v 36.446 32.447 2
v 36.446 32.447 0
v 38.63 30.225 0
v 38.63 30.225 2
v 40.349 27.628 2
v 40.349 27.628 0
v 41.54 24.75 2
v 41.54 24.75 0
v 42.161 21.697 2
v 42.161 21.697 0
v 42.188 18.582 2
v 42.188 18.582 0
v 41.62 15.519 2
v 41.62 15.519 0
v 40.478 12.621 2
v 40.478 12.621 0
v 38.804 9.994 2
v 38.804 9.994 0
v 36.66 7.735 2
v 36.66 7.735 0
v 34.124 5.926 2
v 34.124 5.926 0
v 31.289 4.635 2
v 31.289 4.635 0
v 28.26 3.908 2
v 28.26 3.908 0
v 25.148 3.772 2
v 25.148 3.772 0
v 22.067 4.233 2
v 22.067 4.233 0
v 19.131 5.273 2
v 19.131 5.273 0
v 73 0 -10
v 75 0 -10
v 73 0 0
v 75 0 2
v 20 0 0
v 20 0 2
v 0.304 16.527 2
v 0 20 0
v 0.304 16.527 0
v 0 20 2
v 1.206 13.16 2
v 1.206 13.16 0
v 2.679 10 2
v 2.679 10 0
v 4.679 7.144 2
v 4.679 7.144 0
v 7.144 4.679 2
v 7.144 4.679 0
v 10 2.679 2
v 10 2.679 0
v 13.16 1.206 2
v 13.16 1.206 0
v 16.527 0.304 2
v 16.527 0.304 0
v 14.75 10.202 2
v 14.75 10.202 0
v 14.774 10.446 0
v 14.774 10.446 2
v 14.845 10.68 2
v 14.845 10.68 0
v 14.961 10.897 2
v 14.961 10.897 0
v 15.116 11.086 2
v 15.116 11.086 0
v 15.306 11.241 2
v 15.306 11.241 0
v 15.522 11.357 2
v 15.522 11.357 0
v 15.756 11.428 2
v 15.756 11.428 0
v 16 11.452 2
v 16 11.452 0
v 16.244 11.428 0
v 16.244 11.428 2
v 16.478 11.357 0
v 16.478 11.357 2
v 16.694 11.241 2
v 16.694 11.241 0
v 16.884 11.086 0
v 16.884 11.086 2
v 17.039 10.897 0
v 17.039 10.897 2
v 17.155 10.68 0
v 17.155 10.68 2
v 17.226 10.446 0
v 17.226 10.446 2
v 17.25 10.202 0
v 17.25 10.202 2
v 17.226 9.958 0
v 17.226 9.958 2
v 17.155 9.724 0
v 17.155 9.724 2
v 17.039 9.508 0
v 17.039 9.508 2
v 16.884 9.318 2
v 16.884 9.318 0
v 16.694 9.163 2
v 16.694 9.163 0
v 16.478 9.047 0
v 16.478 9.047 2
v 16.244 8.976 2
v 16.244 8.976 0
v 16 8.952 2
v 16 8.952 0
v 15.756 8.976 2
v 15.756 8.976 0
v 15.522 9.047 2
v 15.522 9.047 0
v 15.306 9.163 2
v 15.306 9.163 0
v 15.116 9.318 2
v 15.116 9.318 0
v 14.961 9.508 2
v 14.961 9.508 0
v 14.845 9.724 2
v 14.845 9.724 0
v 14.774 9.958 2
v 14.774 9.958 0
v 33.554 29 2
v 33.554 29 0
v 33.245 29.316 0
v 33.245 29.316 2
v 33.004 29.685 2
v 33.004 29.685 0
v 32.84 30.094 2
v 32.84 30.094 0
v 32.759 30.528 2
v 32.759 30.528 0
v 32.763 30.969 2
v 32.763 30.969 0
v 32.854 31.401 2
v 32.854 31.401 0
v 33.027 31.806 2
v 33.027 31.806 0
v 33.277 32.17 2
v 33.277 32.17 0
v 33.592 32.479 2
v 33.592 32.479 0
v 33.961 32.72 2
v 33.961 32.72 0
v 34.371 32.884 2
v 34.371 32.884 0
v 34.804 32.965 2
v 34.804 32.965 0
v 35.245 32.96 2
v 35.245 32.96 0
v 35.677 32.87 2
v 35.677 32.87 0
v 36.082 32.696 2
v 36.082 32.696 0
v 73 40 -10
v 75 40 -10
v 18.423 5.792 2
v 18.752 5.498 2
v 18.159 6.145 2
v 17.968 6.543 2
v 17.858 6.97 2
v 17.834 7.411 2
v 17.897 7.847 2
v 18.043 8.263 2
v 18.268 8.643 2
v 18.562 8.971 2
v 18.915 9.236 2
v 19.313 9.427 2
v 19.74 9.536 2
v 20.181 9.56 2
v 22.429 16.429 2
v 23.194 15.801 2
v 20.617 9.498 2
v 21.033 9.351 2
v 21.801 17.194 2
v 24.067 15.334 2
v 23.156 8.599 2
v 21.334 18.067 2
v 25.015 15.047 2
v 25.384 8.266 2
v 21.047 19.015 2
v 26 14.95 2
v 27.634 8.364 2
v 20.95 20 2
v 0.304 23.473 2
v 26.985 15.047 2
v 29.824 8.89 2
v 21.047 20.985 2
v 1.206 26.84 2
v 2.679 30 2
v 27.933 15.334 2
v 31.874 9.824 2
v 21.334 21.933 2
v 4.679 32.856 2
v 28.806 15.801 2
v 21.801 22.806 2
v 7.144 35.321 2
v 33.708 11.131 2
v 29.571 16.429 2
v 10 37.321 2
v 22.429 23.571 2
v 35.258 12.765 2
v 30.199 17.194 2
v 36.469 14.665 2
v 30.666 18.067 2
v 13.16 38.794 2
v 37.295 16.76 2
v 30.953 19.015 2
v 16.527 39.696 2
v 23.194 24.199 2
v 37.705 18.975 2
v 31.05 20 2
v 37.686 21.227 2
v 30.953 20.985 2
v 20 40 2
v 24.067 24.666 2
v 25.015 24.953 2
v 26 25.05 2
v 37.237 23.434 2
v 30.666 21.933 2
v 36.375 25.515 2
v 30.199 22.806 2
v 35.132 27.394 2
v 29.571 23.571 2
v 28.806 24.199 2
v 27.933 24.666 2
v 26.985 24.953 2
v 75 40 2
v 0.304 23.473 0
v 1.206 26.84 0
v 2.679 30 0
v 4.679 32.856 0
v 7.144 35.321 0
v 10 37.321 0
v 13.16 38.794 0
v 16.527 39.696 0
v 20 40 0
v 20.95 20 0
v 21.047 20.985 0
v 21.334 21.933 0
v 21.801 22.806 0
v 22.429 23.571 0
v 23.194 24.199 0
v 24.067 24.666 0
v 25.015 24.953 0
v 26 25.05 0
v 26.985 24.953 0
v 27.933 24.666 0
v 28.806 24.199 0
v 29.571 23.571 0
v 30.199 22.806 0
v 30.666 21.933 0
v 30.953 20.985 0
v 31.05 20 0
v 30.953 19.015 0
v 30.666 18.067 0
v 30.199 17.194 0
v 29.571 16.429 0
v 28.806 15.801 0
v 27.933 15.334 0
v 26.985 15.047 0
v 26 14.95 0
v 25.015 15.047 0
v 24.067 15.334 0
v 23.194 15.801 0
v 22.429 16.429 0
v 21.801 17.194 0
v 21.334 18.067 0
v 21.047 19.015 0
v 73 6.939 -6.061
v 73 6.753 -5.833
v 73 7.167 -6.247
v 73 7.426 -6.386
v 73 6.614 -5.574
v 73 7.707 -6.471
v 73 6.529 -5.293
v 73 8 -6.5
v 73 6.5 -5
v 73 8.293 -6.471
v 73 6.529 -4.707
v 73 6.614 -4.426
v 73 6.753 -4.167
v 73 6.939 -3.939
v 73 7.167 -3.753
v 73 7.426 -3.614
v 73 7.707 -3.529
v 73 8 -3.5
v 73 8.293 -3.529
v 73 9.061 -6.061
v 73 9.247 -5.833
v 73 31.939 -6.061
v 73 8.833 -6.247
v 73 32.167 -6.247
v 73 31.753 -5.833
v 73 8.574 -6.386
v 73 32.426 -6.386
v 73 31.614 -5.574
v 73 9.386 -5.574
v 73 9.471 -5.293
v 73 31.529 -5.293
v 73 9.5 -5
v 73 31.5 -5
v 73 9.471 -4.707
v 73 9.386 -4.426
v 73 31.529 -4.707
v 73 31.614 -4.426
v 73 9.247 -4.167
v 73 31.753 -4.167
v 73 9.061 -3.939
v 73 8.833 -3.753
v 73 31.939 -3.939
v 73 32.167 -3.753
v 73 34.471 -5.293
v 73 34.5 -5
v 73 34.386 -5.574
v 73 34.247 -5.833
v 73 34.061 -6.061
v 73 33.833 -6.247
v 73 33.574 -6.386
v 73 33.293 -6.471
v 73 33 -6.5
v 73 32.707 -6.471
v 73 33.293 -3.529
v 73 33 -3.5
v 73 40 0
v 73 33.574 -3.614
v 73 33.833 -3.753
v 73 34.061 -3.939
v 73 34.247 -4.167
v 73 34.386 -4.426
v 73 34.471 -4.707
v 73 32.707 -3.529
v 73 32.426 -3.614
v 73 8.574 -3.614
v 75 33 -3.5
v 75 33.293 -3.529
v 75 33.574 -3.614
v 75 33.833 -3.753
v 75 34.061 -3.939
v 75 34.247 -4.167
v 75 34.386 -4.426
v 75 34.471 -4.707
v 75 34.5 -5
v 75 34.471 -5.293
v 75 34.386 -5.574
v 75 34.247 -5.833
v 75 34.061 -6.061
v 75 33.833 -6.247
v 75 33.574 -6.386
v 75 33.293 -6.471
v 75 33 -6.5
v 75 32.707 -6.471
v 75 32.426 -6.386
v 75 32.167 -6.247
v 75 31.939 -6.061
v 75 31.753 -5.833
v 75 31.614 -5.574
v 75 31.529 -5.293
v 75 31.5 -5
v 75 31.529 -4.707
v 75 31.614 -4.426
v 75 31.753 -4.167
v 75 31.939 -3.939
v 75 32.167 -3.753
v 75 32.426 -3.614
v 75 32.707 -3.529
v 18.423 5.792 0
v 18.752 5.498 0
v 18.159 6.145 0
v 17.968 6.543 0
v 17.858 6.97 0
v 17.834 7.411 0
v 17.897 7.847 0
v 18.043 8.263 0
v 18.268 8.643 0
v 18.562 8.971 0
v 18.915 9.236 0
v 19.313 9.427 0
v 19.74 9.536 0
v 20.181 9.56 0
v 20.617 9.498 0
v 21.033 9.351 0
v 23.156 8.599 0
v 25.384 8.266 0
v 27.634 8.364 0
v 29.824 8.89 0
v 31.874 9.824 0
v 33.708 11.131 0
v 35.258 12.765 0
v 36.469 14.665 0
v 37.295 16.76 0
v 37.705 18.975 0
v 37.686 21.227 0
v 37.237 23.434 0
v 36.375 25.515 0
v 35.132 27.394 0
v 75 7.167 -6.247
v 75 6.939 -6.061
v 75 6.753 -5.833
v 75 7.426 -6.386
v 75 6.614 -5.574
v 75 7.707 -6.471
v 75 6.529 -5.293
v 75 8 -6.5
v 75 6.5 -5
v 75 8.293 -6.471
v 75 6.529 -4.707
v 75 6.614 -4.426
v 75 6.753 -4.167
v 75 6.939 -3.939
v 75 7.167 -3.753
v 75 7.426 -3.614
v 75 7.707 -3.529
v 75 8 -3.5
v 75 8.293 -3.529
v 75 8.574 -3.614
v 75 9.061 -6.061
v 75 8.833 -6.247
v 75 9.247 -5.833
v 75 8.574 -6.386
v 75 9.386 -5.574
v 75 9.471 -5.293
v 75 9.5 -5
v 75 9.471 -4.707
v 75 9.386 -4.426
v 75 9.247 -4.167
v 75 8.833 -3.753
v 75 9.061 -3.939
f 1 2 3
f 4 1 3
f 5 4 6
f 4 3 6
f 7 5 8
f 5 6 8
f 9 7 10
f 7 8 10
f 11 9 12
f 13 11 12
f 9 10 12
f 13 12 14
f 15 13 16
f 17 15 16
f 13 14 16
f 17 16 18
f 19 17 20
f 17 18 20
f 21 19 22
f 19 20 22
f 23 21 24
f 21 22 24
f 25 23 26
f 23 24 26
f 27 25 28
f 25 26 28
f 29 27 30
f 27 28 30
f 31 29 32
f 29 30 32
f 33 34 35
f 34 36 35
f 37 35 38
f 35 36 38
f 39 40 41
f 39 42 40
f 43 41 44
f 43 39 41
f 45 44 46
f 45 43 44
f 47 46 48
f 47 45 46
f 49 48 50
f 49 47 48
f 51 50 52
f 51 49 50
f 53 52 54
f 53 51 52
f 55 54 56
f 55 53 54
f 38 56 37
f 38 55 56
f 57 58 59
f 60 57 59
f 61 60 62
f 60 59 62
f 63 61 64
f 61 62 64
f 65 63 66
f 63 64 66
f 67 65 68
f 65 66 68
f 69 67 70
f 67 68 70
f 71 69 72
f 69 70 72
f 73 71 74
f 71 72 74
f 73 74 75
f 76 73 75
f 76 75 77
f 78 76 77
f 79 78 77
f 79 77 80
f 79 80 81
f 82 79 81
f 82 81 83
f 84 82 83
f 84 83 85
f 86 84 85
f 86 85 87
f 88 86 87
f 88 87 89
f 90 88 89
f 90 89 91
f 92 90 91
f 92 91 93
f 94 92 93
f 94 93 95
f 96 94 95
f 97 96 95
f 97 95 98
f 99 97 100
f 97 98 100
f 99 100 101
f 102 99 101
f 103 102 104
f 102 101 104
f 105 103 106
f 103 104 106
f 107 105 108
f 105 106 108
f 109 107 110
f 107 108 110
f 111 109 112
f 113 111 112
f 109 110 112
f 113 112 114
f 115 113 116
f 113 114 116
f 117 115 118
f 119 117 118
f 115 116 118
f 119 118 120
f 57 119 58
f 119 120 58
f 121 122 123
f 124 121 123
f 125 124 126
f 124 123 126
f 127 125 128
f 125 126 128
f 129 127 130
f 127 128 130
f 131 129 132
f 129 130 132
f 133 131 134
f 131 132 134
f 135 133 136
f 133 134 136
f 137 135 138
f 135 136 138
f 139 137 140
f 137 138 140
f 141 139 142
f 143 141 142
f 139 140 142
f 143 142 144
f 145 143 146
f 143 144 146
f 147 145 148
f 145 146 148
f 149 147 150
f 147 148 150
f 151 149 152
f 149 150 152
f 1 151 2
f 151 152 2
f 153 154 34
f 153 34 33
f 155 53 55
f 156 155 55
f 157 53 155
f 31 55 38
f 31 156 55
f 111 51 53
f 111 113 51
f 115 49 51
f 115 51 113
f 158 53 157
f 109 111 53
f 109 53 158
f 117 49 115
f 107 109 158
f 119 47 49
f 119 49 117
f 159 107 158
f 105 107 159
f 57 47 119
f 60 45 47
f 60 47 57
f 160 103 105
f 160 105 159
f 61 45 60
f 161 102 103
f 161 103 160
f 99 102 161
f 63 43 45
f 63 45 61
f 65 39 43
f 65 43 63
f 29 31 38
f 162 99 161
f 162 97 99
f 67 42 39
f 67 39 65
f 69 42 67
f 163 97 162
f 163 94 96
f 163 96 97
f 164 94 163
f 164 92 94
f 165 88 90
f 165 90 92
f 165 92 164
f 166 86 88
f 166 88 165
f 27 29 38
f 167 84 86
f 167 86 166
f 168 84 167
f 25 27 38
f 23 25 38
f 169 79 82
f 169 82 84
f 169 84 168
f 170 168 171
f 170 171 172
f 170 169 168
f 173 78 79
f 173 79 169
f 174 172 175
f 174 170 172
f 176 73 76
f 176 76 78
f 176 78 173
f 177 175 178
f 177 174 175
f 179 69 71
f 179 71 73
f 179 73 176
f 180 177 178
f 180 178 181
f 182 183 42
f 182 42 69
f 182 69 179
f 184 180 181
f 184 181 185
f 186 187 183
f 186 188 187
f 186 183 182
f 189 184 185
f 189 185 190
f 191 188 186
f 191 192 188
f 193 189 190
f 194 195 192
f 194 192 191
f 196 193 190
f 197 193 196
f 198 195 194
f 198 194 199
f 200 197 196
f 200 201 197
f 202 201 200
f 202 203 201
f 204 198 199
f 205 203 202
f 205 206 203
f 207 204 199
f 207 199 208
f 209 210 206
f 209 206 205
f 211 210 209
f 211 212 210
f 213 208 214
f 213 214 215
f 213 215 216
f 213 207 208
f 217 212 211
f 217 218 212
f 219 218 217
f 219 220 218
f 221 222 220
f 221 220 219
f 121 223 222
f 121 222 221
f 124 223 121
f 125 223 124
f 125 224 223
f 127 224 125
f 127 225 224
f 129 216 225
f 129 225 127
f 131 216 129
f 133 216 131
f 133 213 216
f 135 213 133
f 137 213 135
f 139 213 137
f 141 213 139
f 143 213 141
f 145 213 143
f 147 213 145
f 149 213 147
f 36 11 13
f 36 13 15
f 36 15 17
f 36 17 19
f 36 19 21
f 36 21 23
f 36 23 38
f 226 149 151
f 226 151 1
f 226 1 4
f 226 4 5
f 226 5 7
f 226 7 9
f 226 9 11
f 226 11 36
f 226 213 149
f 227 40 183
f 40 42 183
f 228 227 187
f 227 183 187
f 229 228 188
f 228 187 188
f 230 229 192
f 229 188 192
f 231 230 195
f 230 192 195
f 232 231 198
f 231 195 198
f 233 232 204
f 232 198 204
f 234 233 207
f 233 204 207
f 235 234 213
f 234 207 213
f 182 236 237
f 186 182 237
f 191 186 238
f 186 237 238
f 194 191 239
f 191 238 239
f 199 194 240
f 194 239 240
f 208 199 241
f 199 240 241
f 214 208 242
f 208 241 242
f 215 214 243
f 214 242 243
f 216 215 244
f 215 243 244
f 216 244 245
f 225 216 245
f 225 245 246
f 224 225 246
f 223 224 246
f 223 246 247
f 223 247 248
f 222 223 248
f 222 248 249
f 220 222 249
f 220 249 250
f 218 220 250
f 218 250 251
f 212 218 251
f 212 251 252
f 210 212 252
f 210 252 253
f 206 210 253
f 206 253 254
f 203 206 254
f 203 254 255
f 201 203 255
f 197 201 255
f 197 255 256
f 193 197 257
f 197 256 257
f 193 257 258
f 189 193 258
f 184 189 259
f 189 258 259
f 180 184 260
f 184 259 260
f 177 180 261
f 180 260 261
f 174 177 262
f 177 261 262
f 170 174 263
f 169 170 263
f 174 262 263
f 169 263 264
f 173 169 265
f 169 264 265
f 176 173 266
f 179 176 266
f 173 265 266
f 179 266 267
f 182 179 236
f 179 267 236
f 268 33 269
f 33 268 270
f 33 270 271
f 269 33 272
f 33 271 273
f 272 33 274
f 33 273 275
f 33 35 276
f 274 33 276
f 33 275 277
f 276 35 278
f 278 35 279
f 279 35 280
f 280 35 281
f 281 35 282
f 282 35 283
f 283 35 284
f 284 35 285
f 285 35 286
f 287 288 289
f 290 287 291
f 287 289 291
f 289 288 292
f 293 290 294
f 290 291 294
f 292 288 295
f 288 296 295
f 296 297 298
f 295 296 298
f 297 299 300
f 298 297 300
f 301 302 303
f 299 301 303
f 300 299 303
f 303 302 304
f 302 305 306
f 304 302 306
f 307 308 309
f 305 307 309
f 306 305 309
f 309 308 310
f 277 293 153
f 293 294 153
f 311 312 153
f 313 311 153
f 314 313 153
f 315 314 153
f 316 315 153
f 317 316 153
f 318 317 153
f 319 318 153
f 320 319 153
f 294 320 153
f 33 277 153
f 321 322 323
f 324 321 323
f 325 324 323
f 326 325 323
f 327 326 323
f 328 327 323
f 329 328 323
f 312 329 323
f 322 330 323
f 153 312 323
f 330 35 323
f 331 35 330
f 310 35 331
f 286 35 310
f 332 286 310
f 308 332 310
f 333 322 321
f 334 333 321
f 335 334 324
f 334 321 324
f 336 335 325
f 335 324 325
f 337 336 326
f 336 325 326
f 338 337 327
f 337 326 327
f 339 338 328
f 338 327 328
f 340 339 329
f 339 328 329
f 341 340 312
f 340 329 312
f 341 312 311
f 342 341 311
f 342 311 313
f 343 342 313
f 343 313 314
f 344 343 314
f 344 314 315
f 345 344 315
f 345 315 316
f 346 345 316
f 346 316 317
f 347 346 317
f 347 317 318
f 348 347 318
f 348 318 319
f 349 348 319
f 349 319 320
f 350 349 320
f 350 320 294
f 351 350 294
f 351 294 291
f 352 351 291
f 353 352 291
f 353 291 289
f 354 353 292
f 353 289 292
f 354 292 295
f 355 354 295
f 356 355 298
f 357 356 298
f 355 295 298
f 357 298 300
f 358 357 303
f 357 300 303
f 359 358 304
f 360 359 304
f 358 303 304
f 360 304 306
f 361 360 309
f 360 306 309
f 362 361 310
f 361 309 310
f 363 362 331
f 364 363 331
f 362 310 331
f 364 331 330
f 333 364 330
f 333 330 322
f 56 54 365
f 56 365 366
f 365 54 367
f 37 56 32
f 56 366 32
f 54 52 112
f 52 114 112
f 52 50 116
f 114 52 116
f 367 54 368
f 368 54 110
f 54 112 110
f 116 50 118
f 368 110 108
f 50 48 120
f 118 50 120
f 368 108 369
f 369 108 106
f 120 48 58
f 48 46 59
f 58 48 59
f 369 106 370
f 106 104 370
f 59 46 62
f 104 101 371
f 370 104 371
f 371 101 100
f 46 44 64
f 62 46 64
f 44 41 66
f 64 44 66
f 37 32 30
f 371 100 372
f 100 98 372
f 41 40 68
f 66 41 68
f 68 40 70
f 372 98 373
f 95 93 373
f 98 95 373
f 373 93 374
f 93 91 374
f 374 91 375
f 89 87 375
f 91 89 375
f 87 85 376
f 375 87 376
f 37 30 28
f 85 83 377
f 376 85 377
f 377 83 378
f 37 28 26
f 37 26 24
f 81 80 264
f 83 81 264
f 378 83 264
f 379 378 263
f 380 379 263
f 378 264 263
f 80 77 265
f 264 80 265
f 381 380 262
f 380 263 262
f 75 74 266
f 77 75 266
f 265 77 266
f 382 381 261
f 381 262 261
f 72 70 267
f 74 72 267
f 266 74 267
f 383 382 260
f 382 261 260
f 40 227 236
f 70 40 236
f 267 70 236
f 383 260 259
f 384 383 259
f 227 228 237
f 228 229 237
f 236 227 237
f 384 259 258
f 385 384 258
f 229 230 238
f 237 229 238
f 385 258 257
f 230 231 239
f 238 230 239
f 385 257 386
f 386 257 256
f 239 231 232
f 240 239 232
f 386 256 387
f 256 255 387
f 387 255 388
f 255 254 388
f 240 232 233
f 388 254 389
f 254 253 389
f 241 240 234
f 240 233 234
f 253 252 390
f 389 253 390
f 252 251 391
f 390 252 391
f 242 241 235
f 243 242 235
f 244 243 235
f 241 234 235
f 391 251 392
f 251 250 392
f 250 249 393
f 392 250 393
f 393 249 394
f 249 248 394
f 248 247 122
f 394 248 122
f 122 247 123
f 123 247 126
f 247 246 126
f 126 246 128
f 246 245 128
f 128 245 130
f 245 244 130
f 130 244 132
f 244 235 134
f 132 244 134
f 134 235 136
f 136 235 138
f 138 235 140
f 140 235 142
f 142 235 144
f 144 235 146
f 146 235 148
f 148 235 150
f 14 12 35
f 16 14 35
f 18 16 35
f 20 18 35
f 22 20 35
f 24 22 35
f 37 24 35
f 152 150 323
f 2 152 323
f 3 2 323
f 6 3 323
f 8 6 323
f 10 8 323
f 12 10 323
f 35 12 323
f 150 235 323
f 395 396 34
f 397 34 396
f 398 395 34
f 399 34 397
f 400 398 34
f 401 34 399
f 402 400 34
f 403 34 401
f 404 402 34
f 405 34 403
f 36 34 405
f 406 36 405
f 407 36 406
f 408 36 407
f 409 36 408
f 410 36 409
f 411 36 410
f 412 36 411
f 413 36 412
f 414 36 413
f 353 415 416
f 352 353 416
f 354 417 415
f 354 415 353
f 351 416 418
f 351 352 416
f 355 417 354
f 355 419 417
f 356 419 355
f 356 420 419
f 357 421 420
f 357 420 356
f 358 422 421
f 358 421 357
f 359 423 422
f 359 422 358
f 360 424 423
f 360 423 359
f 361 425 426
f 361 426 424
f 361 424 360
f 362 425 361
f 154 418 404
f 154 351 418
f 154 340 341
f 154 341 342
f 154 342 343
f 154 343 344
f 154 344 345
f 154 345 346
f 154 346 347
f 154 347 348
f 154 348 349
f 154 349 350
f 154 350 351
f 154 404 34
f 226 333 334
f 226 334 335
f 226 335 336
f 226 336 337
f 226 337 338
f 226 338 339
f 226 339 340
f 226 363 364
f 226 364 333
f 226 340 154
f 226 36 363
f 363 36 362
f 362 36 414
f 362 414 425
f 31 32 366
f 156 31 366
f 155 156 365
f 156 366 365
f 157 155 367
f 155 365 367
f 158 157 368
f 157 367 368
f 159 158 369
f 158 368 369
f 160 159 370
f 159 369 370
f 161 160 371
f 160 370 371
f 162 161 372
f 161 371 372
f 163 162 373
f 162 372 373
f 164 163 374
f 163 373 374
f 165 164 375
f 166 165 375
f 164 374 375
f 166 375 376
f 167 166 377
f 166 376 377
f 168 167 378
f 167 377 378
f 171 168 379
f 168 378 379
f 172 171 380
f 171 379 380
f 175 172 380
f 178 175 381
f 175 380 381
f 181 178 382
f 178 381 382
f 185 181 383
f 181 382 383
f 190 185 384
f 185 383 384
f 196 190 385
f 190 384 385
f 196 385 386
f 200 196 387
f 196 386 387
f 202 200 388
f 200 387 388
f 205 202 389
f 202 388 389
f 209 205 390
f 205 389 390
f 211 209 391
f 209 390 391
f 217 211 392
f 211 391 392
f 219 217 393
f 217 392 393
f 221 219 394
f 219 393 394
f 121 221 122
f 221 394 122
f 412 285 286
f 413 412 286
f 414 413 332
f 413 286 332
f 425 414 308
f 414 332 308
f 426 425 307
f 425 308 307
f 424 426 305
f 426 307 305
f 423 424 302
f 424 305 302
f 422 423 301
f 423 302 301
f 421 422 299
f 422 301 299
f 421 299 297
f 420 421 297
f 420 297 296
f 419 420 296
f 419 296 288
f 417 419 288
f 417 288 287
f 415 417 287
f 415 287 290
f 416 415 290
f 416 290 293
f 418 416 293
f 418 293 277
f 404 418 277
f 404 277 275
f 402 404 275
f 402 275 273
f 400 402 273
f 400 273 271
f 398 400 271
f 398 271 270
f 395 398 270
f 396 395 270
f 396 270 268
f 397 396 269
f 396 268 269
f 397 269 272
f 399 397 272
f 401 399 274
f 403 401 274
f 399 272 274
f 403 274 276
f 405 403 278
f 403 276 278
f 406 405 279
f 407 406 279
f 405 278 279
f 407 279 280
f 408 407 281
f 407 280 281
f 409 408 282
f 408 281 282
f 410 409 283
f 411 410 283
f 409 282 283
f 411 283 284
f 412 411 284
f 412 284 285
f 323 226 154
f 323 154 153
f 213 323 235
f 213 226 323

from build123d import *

# Parameters (mm, degrees)
SKETCH_2_W          = 75
SKETCH_2_H          = 40
EXTRUDE_1_DEPTH     = 2
SKETCH_3_R          = 5.05
SKETCH_3_R_2        = 1.25
CUT_EXTRUDE_1_DEPTH = 86.023526156
FILLET_1_R          = 20
SKETCH_7_W          = 2
SKETCH_7_H          = 40
EXTRUDE_3_DEPTH     = 10
SKETCH_10_R         = 1.5
CUT_EXTRUDE_4_DEPTH = 84.839131675


with BuildPart() as part:
    # 草图2 → 凸台-拉伸1 (new body)
    with BuildSketch(Plane.XY):
        with Locations((37.5, 20)):
            Rectangle(SKETCH_2_W, SKETCH_2_H)
    extrude(amount=EXTRUDE_1_DEPTH)

    # 草图3 → 切除-拉伸1 (cut, through all)
    with BuildSketch(Plane(origin=(0, 0, 0), x_dir=(-1, 0, 0), z_dir=(0, 0, -1))):
        with Locations((-26, 20)):
            Circle(SKETCH_3_R)
        with Locations((-16, 10.202041029)):
            Circle(SKETCH_3_R_2)
        with BuildLine():
            ThreePointArc((-36.446428571, 32.447274003), (-39.704318392, 11.267637352), (-19.131116422, 5.273121906))
            ThreePointArc((-19.131116422, 5.273121906), (-18.043086412, 8.263304292), (-21.033268797, 9.351334301))
            ThreePointArc((-21.033268797, 9.351334301), (-35.909276376, 13.685830085), (-33.553571429, 29.000336587))
            ThreePointArc((-33.553571429, 29.000336587), (-33.276531292, 32.170233866), (-36.446428571, 32.447274003))
        make_face()
    extrude(amount=-CUT_EXTRUDE_1_DEPTH, mode=Mode.SUBTRACT)

    # 圆角1
    fillet_1_edges = [part.edges().sort_by_distance(p)[0] for p in [
        (0, 40, 1),
        (0, 0, 1),
    ]]
    fillet(fillet_1_edges, radius=FILLET_1_R - 0.0001)  # a hair under: the kernel refuses the full size

    # 草图7 → 凸台-拉伸3 (add)
    with BuildSketch(Plane(origin=(0, 0, 0), x_dir=(-1, 0, 0), z_dir=(0, 0, -1))):
        with Locations((-74, 20)):
            Rectangle(SKETCH_7_W, SKETCH_7_H)
    extrude(amount=EXTRUDE_3_DEPTH)

    # 草图10 → 切除-拉伸4 (cut, through all)
    with BuildSketch(Plane.ZY.offset(-73)):
        with Locations((-5, 33)):
            Circle(SKETCH_10_R)
        with Locations((-5, 8)):
            Circle(SKETCH_10_R)
    extrude(amount=-CUT_EXTRUDE_4_DEPTH, mode=Mode.SUBTRACT)


solid = part.part
